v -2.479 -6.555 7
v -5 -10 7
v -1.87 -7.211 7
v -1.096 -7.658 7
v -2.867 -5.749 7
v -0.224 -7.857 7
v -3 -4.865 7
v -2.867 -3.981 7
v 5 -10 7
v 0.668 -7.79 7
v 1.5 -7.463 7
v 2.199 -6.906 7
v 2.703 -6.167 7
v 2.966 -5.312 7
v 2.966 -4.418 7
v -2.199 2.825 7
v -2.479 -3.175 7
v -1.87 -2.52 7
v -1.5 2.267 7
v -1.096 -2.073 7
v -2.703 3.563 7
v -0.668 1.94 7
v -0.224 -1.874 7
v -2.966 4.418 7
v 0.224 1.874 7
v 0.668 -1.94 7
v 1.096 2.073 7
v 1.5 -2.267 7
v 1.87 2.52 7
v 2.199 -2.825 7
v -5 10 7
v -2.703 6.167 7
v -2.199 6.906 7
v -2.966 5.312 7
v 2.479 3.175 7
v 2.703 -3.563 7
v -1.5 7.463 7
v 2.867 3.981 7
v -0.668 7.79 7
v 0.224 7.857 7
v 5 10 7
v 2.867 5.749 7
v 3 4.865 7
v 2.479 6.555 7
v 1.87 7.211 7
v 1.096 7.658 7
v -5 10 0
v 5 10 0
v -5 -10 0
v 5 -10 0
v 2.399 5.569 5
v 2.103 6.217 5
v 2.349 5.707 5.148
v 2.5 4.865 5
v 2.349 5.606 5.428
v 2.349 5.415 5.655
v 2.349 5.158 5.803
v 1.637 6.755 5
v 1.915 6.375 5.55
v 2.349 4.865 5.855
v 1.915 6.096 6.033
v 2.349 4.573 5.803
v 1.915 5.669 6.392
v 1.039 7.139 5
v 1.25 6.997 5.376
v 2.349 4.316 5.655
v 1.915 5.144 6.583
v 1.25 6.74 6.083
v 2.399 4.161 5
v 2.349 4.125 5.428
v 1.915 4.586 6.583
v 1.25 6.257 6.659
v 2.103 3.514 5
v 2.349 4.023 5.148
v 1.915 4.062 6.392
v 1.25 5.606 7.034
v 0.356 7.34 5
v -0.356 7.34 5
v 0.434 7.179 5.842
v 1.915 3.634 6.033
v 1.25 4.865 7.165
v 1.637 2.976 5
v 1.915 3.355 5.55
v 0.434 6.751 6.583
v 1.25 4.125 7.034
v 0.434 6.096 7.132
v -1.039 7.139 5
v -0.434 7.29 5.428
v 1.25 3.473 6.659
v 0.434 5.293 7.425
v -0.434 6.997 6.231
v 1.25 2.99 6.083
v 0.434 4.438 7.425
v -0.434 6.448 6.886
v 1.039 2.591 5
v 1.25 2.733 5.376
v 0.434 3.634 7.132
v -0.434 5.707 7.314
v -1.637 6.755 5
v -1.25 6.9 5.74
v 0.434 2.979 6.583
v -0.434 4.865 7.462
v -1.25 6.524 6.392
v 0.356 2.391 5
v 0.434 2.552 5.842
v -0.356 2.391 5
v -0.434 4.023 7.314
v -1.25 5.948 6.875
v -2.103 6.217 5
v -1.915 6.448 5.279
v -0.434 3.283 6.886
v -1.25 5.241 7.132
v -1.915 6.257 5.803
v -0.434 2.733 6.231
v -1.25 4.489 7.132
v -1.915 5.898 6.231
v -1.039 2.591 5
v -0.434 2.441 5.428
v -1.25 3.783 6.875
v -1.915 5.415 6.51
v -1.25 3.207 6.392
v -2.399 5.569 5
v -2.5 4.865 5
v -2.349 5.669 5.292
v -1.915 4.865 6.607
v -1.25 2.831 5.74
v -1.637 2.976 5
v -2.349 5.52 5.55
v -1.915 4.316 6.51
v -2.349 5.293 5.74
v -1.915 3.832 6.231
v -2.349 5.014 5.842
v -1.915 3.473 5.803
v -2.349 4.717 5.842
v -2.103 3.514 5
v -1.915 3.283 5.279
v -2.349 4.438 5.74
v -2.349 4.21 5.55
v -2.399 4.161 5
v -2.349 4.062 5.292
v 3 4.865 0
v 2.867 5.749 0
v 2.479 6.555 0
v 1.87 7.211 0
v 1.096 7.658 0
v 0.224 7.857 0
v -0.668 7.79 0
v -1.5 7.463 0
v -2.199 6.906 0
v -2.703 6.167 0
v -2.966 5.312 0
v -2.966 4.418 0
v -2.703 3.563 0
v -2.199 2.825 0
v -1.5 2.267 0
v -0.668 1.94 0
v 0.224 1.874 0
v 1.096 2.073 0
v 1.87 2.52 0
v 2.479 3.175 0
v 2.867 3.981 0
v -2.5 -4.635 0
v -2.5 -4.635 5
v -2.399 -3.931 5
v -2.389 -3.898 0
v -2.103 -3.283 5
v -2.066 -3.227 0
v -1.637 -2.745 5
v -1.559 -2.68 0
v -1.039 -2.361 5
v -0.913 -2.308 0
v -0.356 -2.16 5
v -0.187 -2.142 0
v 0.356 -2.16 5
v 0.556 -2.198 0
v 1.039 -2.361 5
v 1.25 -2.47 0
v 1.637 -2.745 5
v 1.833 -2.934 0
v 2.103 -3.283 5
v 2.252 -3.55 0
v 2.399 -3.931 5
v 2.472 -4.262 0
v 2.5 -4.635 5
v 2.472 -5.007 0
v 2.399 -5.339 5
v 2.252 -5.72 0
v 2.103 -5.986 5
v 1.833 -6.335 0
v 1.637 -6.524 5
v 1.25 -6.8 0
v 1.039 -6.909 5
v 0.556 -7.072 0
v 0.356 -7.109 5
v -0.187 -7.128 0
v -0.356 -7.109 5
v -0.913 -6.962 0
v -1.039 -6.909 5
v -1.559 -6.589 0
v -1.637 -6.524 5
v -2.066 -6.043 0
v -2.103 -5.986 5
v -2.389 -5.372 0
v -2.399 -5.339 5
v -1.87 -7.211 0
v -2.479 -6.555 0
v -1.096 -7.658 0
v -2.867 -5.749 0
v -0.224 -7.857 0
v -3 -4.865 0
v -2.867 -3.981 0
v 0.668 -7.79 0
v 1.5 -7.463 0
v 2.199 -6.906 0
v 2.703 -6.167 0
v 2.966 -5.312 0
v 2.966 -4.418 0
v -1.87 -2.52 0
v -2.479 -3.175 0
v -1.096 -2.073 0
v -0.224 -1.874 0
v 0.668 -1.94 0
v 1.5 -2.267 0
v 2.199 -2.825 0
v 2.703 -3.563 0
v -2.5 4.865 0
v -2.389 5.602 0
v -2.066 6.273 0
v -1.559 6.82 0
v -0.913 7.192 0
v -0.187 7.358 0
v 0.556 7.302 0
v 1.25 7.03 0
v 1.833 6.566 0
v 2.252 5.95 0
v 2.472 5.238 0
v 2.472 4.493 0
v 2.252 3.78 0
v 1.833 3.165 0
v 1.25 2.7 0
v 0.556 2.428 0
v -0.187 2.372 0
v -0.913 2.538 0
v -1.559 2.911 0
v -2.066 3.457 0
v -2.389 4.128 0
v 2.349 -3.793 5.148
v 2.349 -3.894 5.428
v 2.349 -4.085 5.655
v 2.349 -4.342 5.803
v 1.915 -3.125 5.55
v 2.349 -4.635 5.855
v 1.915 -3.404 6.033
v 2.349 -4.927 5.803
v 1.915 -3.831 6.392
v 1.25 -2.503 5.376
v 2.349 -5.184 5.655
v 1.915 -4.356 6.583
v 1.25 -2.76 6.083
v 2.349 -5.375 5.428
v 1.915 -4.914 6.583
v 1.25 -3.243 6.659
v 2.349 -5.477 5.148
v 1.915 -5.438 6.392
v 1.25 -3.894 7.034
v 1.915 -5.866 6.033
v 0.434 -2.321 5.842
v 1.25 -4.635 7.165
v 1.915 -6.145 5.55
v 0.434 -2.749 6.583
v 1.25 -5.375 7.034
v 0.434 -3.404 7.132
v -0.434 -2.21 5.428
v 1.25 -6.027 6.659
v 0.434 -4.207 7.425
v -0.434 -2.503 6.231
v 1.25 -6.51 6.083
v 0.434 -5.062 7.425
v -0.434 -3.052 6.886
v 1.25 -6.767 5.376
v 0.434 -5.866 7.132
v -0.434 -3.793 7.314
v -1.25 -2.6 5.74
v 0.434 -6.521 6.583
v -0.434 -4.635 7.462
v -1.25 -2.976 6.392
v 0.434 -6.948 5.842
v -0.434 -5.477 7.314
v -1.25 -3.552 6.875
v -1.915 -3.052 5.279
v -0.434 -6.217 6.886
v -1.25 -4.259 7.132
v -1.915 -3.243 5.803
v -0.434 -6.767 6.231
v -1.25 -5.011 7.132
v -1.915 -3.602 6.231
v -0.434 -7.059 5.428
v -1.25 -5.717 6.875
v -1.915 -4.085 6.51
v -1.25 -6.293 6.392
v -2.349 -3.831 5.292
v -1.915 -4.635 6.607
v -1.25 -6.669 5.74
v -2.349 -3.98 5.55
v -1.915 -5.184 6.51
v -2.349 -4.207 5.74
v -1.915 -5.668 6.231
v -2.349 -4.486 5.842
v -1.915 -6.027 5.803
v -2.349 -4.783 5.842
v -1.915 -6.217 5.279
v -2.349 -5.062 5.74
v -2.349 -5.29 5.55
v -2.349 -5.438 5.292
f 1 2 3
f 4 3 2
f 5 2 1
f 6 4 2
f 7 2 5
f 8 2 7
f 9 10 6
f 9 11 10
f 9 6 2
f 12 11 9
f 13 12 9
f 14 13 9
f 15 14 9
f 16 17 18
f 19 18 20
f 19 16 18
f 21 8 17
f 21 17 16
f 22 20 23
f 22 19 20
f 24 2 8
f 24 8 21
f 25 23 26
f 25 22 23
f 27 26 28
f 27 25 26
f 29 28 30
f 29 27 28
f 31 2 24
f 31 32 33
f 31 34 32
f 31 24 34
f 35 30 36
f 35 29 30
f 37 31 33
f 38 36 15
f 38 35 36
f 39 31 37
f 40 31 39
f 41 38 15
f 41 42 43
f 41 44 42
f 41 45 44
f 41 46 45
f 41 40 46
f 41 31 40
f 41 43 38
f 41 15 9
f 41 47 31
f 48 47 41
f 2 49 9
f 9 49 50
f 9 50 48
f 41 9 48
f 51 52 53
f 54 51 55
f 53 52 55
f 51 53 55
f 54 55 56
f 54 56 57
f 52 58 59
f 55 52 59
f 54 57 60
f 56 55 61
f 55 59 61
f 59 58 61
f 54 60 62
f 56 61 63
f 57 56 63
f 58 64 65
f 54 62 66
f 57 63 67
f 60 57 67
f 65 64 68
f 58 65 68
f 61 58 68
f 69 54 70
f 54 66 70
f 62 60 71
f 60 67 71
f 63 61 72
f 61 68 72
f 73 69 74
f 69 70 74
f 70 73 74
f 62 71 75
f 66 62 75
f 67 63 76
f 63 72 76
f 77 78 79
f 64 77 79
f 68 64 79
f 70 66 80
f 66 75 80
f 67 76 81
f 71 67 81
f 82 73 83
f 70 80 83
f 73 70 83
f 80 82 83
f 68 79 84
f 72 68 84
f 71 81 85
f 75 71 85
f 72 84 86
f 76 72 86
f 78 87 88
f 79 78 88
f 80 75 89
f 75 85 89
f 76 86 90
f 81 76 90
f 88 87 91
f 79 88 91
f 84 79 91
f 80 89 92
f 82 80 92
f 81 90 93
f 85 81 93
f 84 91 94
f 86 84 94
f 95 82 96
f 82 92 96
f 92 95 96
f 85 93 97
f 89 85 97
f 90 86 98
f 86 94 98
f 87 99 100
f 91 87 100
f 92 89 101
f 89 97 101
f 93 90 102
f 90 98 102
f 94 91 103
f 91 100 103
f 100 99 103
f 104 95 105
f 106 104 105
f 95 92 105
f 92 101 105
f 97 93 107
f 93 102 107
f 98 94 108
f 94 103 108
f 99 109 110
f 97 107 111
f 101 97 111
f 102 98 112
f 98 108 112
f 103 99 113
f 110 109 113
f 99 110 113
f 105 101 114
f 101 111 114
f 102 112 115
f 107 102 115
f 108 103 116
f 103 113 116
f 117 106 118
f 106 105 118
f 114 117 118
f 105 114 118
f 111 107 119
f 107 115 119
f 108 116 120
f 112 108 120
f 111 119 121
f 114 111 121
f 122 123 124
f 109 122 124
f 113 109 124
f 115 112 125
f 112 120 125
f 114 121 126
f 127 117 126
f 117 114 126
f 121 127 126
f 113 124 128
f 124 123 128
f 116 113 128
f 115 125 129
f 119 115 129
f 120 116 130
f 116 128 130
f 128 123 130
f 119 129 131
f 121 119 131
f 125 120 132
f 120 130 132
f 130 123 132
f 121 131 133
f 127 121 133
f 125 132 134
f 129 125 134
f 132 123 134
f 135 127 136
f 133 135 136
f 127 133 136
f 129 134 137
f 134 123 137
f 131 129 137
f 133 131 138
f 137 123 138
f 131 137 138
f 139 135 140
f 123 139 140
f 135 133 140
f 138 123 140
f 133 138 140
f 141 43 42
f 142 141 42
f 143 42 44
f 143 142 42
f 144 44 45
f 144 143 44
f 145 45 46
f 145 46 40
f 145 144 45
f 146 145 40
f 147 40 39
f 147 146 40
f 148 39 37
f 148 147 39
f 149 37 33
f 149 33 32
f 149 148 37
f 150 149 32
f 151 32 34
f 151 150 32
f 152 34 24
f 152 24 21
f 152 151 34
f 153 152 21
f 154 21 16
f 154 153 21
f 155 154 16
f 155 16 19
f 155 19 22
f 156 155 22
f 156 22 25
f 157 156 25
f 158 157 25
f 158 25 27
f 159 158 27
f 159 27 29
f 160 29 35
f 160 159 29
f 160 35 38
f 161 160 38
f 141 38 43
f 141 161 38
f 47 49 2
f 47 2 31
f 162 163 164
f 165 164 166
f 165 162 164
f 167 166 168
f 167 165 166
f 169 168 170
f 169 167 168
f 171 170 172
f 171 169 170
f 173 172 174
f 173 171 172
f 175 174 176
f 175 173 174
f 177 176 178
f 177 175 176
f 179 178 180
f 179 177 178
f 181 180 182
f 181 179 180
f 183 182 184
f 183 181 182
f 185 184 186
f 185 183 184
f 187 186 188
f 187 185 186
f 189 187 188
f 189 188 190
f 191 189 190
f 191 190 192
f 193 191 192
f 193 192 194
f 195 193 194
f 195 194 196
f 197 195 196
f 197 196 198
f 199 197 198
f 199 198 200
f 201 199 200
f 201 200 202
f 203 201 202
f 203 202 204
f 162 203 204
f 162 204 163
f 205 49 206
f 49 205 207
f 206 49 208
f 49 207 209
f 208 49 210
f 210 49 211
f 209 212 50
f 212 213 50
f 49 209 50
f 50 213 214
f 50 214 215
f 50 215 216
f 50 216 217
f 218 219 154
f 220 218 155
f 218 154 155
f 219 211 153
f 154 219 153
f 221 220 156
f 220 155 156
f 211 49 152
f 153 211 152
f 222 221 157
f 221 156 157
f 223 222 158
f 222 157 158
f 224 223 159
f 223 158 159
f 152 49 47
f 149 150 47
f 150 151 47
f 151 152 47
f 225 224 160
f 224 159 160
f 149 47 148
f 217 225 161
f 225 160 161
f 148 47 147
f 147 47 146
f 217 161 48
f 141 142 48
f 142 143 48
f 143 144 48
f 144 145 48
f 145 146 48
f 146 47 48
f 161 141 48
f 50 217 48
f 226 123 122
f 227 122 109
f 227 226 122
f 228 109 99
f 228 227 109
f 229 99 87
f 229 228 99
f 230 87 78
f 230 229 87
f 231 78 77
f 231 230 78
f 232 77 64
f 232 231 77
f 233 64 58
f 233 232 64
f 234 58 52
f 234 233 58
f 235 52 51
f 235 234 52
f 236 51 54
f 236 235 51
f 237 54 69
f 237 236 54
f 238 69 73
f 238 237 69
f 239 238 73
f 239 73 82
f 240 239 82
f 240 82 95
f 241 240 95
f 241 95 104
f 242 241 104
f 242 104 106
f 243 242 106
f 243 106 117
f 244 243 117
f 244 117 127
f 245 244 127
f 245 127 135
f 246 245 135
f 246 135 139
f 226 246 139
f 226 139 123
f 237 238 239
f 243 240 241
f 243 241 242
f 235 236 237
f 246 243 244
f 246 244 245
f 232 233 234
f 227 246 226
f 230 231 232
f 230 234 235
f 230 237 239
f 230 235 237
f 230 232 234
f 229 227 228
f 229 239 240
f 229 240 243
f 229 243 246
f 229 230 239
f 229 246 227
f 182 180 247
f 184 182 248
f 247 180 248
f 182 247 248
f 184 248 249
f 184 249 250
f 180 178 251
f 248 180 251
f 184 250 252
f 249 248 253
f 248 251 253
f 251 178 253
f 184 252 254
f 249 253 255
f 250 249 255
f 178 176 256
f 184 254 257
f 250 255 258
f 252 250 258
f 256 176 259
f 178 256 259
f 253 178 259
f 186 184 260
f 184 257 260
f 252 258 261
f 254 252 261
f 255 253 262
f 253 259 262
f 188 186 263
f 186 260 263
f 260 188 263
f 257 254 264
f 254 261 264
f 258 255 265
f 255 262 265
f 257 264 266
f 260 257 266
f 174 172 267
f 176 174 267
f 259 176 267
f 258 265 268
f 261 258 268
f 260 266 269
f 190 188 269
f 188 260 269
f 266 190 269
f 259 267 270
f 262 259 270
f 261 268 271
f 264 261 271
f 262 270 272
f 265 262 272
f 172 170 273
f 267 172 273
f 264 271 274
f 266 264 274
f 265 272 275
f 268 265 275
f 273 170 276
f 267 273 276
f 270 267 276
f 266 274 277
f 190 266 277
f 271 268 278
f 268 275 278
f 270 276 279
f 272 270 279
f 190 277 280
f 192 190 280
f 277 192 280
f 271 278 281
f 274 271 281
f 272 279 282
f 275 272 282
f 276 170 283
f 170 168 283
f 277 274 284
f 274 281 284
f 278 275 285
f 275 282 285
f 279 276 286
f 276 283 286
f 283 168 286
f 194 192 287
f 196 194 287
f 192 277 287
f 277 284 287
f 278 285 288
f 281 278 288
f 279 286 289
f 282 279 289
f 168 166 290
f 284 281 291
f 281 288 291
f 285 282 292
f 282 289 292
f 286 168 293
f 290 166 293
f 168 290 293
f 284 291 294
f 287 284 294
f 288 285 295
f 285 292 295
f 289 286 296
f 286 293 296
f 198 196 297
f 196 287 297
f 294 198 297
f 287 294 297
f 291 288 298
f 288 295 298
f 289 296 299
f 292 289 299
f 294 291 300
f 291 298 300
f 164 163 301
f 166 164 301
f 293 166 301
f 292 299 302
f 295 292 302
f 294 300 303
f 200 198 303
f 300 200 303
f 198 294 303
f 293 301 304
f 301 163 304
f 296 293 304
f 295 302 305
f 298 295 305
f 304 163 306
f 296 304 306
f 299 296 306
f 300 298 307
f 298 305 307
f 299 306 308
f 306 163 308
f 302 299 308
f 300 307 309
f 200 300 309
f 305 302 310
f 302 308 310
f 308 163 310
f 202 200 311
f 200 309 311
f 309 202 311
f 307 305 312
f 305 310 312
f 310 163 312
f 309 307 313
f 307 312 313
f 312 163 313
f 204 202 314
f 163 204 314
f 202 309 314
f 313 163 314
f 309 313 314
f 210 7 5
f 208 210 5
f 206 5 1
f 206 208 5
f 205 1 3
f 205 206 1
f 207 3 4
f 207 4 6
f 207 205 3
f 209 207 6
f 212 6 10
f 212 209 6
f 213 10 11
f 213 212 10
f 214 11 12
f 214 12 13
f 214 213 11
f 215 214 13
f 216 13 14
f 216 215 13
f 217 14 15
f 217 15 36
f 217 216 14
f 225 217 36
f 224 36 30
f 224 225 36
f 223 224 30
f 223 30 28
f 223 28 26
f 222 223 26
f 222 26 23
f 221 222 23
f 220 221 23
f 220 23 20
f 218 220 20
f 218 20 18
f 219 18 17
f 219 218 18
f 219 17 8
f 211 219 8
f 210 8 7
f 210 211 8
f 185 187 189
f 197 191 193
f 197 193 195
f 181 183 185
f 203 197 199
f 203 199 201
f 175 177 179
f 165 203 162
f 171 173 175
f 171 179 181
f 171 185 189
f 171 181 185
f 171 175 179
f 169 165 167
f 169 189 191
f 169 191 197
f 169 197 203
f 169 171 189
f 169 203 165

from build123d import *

# Parameters (mm, degrees)
SKETCH2_W           = 10
SKETCH2_H           = 20
SKETCH2_R           = 3
BOSS_EXTRUDE1_DEPTH = 7
SKETCH3_R           = 2.5
BOSS_EXTRUDE2_DEPTH = 5
REVOLVE1_ANGLE      = 180
LPATTERN1_COUNT     = 2
LPATTERN1_PITCH     = 9.5


with BuildPart() as part:
    # Sketch2 → Boss-Extrude1 (new body)
    with BuildSketch(Plane.XY):
        Rectangle(SKETCH2_W, SKETCH2_H)
        with Locations((0, 4.865127234)):
            Circle(SKETCH2_R, mode=Mode.SUBTRACT)
        with Locations(Location((0, -4.865127234, 0), (0, 0, 180))):
            Circle(SKETCH2_R, mode=Mode.SUBTRACT)
    extrude(amount=BOSS_EXTRUDE1_DEPTH)


with BuildPart() as body_2:
    # Sketch3 → Boss-Extrude2 (new body)
    with BuildSketch(Plane(origin=(0, 0, 0), x_dir=(-1, 0, 0), z_dir=(0, 0, -1))):
        with Locations((0, 4.865127234)):
            Circle(SKETCH3_R)
    boss_extrude2 = extrude(amount=-BOSS_EXTRUDE2_DEPTH)

    # Sketch4 → Revolve1 (revolve)
    with BuildSketch(Plane.XY.offset(5)):
        with BuildLine():
            Line((-2.5, 4.865127234), (2.5, 4.865127234))
            ThreePointArc((2.5, 4.865127234), (0, 7.365127234), (-2.5, 4.865127234))
        make_face()
    revolve1 = revolve(axis=Axis((-2.5, 4.865127234, 5), (1, 0, 0)), revolution_arc=REVOLVE1_ANGLE)


with BuildPart() as lpattern1_1:
    # LPattern1: Boss-Extrude2, Revolve1 ×2
    with Locations(*[(0, -i * LPATTERN1_PITCH, 0) for i in range(1, LPATTERN1_COUNT)]):
        add(boss_extrude2)
        add(revolve1)


solid = Compound([part.part, body_2.part, lpattern1_1.part])
